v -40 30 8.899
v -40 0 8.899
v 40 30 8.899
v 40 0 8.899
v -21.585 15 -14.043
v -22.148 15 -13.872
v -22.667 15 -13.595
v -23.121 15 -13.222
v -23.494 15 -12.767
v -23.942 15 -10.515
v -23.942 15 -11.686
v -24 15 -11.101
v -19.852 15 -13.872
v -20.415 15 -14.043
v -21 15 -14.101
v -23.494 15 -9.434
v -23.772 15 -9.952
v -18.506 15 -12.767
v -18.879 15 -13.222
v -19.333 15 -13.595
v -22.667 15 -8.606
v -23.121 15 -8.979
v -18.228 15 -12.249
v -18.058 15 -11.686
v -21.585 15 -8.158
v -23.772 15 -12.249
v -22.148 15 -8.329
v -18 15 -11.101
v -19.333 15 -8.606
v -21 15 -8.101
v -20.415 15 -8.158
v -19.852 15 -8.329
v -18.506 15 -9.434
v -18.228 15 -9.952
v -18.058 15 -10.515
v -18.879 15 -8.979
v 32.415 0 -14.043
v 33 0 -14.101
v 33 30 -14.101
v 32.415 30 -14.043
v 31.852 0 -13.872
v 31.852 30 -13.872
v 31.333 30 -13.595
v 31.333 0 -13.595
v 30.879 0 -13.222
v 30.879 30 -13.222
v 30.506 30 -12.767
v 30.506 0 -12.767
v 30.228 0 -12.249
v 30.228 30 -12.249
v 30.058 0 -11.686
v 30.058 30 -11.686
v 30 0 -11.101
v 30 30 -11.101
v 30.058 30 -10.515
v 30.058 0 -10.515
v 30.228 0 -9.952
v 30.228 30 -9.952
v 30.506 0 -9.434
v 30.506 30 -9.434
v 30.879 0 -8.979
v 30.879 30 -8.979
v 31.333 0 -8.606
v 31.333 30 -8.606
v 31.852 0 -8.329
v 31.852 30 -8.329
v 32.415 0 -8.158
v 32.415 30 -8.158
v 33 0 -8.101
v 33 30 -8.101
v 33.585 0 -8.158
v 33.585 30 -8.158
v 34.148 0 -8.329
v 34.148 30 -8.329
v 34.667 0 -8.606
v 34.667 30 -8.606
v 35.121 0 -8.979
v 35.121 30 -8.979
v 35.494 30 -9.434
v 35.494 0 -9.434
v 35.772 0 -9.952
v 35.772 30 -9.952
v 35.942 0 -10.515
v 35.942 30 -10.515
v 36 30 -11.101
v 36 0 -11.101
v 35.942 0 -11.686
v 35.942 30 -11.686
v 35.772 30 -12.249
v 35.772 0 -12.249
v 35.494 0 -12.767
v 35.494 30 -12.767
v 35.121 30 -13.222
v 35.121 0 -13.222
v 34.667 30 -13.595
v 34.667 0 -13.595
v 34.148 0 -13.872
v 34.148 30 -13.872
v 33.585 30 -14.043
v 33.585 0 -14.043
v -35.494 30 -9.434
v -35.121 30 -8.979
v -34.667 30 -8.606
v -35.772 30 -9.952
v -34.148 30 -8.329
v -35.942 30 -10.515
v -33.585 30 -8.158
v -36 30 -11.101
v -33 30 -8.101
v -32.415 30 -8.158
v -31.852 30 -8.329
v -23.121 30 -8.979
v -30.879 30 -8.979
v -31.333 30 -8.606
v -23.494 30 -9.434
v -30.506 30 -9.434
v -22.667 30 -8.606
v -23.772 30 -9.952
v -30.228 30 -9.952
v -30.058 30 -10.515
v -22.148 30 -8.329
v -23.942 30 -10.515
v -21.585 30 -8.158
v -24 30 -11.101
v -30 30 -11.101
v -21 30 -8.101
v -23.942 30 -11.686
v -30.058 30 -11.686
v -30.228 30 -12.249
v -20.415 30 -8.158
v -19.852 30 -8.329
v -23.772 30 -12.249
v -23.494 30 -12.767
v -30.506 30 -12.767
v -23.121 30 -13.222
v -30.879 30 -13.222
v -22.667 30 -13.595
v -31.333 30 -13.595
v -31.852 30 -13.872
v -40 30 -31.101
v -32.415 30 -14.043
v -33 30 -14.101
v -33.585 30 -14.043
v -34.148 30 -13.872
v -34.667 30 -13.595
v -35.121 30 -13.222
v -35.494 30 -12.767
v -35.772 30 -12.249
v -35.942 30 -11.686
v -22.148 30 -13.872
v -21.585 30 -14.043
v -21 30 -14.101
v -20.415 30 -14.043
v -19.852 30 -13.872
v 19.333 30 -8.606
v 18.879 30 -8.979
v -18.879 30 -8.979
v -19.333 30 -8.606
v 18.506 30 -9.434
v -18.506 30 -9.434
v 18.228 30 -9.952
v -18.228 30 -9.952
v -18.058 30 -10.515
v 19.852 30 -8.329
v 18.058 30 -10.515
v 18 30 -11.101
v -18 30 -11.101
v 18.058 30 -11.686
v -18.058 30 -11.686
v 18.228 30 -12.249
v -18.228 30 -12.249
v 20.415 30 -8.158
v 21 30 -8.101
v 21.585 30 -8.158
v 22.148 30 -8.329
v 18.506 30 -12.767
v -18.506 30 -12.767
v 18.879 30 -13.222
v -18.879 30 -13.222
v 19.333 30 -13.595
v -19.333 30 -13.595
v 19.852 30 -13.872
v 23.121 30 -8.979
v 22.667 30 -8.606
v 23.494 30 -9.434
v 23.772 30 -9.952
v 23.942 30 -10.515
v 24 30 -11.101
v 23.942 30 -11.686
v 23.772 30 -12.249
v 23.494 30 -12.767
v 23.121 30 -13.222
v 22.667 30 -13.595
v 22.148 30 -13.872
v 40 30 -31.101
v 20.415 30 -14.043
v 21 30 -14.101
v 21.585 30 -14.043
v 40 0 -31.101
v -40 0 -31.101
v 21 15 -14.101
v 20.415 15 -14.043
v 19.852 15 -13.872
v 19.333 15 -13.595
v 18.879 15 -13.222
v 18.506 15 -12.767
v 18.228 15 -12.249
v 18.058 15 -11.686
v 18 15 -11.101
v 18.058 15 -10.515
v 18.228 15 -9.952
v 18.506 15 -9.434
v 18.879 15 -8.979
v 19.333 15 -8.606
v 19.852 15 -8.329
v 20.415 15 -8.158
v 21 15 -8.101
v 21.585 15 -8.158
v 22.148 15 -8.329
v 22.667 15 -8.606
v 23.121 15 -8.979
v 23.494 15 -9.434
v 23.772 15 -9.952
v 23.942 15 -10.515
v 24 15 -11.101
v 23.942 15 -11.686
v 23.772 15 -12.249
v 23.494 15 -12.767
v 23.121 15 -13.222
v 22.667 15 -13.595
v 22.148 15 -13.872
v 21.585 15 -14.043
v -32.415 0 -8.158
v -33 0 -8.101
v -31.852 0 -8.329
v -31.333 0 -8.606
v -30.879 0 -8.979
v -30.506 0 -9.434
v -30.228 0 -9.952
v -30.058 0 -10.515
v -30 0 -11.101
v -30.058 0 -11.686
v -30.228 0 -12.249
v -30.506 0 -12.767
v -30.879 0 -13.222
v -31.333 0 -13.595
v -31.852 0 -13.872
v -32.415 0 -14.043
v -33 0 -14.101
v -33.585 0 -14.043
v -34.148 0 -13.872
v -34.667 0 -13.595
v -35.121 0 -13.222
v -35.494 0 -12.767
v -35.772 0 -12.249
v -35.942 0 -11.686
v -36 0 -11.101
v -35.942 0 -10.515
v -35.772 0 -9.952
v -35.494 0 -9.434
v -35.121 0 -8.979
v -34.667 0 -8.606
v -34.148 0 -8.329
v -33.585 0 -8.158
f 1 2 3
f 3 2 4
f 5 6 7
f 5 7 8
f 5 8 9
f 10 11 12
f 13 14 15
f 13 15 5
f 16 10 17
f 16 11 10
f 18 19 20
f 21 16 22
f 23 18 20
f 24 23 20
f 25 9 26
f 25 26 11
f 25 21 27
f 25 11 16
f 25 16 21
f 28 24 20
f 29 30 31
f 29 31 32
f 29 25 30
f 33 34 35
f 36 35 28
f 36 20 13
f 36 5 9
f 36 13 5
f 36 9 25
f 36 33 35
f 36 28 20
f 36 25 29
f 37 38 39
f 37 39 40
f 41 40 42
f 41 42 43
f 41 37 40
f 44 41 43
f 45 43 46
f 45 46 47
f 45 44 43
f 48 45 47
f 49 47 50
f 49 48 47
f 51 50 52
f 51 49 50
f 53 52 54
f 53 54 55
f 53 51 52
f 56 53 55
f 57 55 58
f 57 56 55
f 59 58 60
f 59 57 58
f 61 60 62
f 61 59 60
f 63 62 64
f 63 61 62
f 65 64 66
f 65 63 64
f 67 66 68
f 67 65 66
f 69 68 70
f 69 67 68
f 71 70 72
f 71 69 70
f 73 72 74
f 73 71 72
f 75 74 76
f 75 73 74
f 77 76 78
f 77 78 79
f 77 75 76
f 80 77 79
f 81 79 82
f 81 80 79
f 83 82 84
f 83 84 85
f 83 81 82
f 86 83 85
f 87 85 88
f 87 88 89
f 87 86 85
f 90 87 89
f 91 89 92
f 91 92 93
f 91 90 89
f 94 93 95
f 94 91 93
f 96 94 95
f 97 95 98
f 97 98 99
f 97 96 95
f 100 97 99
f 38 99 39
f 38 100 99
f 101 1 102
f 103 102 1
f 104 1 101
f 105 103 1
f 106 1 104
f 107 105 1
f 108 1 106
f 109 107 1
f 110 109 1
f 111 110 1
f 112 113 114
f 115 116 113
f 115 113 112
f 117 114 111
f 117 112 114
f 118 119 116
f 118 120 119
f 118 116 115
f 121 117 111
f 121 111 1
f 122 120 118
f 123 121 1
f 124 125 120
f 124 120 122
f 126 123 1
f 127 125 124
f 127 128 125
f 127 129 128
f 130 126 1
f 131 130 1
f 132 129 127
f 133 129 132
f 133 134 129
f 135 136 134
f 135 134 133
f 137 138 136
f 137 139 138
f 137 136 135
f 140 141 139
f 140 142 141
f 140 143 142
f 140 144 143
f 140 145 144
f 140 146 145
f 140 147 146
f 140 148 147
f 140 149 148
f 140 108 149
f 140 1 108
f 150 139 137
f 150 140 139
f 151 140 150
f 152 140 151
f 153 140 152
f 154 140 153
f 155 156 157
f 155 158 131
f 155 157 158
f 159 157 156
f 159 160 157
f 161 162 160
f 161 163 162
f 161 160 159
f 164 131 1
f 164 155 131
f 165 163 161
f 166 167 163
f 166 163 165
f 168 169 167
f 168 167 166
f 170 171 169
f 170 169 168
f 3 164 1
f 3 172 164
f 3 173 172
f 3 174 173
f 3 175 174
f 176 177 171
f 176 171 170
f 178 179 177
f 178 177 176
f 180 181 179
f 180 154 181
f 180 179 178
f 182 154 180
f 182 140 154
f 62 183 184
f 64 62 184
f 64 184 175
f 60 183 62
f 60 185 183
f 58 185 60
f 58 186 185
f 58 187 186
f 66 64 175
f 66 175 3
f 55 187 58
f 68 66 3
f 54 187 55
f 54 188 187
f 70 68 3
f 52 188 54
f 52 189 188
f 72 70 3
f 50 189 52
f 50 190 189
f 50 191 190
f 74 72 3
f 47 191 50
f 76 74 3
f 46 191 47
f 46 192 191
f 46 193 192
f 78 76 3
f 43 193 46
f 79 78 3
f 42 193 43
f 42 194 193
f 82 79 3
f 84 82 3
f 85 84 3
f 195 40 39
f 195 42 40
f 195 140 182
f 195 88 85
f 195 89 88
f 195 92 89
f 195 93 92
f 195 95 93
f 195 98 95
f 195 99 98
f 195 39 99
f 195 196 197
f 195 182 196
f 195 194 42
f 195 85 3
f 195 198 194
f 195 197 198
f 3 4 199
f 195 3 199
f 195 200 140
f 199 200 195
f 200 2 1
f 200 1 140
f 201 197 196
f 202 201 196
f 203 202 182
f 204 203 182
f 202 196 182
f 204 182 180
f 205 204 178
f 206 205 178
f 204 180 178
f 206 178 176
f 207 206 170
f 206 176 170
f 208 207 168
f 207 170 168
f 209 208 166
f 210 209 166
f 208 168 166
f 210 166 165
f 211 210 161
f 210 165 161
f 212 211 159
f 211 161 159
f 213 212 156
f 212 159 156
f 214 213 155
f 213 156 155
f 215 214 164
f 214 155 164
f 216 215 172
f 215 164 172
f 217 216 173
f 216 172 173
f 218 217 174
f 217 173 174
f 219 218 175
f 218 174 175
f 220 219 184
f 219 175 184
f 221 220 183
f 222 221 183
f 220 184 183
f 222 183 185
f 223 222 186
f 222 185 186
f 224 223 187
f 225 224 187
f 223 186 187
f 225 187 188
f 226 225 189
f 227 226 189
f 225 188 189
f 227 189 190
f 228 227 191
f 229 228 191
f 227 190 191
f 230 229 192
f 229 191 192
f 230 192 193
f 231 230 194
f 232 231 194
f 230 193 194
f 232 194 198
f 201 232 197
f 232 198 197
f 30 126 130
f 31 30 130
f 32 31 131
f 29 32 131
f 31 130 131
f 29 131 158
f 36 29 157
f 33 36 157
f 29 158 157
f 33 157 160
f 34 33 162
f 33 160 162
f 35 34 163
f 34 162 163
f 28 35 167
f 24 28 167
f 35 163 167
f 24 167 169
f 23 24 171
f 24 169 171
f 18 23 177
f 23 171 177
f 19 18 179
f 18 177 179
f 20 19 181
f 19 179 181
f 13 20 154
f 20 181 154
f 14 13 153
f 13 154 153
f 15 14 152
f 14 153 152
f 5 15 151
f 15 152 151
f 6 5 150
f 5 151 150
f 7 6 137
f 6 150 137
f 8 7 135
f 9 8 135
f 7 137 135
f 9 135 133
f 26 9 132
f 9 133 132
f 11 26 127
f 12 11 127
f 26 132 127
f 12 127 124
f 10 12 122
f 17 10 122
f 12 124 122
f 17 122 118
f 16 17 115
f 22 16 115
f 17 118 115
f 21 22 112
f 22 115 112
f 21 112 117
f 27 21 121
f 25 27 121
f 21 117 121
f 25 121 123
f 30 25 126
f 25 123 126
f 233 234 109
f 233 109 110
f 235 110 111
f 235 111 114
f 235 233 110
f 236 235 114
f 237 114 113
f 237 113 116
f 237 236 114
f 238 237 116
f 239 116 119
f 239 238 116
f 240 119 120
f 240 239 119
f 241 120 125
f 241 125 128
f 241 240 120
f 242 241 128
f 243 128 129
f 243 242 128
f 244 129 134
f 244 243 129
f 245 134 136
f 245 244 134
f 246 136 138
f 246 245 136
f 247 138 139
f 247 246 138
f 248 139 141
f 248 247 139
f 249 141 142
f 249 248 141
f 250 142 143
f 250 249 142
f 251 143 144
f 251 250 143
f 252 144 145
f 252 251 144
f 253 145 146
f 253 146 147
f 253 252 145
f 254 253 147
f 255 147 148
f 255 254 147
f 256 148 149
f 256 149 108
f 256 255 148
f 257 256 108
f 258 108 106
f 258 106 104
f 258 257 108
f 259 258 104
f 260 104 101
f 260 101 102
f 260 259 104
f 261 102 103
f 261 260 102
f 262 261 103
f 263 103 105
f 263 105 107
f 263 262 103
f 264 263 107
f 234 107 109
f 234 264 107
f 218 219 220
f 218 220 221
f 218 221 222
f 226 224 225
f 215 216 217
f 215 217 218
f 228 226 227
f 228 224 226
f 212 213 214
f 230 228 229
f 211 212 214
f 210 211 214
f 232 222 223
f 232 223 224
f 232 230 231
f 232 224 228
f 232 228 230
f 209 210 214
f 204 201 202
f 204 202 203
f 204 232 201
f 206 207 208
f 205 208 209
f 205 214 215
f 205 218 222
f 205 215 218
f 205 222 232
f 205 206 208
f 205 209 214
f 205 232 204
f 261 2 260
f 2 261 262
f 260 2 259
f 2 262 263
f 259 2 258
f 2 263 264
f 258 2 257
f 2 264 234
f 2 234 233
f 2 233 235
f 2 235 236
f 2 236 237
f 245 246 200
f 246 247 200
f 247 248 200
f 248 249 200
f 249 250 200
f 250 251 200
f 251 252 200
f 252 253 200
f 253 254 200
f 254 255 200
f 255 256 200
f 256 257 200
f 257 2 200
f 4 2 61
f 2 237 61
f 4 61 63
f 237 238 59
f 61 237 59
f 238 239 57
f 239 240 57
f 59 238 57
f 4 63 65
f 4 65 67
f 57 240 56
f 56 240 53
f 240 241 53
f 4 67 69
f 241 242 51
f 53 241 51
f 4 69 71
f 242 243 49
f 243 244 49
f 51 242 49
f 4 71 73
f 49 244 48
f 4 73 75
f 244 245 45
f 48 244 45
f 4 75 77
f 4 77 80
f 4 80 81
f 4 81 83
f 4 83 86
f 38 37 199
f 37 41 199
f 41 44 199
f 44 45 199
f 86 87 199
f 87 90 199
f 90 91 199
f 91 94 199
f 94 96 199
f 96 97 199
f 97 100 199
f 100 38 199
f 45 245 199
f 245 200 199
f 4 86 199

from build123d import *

# Parameters (mm, degrees)
SKETCH1_W           = 80
SKETCH1_H           = 40
SKETCH1_R           = 3
BOSS_EXTRUDE1_DEPTH = 30
SKETCH2_R           = 3
CUT_EXTRUDE1_DEPTH  = 15


with BuildPart() as part:
    # Sketch1 → Boss-Extrude1 (new body)
    with BuildSketch(Plane(origin=(0, 0, 0), x_dir=(1, 0, 0), z_dir=(0, 1, 0))):
        with Locations((0, 11.100547393)):
            Rectangle(SKETCH1_W, SKETCH1_H)
        with Locations(Location((-33, 11.100547393, 0), (0, 0, 270))):  # turned: the seam where the file's is
            Circle(SKETCH1_R, mode=Mode.SUBTRACT)
        with Locations(Location((33, 11.100547393, 0), (0, 0, 90))):  # turned: the seam where the file's is
            Circle(SKETCH1_R, mode=Mode.SUBTRACT)
    extrude(amount=BOSS_EXTRUDE1_DEPTH)

    # Sketch2 → Cut-Extrude1 (cut)
    with BuildSketch(Plane(origin=(0, 30, 0), x_dir=(-1, 0, 0), z_dir=(0, 1, 0))):
        with Locations(Location((21, -11.100547393, 0), (0, 0, 90))):  # turned: the seam where the file's is
            Circle(SKETCH2_R)
        with Locations(Location((-21, -11.100547393, 0), (0, 0, 270))):  # turned: the seam where the file's is
            Circle(SKETCH2_R)
    extrude(amount=-CUT_EXTRUDE1_DEPTH, mode=Mode.SUBTRACT)


solid = part.part
